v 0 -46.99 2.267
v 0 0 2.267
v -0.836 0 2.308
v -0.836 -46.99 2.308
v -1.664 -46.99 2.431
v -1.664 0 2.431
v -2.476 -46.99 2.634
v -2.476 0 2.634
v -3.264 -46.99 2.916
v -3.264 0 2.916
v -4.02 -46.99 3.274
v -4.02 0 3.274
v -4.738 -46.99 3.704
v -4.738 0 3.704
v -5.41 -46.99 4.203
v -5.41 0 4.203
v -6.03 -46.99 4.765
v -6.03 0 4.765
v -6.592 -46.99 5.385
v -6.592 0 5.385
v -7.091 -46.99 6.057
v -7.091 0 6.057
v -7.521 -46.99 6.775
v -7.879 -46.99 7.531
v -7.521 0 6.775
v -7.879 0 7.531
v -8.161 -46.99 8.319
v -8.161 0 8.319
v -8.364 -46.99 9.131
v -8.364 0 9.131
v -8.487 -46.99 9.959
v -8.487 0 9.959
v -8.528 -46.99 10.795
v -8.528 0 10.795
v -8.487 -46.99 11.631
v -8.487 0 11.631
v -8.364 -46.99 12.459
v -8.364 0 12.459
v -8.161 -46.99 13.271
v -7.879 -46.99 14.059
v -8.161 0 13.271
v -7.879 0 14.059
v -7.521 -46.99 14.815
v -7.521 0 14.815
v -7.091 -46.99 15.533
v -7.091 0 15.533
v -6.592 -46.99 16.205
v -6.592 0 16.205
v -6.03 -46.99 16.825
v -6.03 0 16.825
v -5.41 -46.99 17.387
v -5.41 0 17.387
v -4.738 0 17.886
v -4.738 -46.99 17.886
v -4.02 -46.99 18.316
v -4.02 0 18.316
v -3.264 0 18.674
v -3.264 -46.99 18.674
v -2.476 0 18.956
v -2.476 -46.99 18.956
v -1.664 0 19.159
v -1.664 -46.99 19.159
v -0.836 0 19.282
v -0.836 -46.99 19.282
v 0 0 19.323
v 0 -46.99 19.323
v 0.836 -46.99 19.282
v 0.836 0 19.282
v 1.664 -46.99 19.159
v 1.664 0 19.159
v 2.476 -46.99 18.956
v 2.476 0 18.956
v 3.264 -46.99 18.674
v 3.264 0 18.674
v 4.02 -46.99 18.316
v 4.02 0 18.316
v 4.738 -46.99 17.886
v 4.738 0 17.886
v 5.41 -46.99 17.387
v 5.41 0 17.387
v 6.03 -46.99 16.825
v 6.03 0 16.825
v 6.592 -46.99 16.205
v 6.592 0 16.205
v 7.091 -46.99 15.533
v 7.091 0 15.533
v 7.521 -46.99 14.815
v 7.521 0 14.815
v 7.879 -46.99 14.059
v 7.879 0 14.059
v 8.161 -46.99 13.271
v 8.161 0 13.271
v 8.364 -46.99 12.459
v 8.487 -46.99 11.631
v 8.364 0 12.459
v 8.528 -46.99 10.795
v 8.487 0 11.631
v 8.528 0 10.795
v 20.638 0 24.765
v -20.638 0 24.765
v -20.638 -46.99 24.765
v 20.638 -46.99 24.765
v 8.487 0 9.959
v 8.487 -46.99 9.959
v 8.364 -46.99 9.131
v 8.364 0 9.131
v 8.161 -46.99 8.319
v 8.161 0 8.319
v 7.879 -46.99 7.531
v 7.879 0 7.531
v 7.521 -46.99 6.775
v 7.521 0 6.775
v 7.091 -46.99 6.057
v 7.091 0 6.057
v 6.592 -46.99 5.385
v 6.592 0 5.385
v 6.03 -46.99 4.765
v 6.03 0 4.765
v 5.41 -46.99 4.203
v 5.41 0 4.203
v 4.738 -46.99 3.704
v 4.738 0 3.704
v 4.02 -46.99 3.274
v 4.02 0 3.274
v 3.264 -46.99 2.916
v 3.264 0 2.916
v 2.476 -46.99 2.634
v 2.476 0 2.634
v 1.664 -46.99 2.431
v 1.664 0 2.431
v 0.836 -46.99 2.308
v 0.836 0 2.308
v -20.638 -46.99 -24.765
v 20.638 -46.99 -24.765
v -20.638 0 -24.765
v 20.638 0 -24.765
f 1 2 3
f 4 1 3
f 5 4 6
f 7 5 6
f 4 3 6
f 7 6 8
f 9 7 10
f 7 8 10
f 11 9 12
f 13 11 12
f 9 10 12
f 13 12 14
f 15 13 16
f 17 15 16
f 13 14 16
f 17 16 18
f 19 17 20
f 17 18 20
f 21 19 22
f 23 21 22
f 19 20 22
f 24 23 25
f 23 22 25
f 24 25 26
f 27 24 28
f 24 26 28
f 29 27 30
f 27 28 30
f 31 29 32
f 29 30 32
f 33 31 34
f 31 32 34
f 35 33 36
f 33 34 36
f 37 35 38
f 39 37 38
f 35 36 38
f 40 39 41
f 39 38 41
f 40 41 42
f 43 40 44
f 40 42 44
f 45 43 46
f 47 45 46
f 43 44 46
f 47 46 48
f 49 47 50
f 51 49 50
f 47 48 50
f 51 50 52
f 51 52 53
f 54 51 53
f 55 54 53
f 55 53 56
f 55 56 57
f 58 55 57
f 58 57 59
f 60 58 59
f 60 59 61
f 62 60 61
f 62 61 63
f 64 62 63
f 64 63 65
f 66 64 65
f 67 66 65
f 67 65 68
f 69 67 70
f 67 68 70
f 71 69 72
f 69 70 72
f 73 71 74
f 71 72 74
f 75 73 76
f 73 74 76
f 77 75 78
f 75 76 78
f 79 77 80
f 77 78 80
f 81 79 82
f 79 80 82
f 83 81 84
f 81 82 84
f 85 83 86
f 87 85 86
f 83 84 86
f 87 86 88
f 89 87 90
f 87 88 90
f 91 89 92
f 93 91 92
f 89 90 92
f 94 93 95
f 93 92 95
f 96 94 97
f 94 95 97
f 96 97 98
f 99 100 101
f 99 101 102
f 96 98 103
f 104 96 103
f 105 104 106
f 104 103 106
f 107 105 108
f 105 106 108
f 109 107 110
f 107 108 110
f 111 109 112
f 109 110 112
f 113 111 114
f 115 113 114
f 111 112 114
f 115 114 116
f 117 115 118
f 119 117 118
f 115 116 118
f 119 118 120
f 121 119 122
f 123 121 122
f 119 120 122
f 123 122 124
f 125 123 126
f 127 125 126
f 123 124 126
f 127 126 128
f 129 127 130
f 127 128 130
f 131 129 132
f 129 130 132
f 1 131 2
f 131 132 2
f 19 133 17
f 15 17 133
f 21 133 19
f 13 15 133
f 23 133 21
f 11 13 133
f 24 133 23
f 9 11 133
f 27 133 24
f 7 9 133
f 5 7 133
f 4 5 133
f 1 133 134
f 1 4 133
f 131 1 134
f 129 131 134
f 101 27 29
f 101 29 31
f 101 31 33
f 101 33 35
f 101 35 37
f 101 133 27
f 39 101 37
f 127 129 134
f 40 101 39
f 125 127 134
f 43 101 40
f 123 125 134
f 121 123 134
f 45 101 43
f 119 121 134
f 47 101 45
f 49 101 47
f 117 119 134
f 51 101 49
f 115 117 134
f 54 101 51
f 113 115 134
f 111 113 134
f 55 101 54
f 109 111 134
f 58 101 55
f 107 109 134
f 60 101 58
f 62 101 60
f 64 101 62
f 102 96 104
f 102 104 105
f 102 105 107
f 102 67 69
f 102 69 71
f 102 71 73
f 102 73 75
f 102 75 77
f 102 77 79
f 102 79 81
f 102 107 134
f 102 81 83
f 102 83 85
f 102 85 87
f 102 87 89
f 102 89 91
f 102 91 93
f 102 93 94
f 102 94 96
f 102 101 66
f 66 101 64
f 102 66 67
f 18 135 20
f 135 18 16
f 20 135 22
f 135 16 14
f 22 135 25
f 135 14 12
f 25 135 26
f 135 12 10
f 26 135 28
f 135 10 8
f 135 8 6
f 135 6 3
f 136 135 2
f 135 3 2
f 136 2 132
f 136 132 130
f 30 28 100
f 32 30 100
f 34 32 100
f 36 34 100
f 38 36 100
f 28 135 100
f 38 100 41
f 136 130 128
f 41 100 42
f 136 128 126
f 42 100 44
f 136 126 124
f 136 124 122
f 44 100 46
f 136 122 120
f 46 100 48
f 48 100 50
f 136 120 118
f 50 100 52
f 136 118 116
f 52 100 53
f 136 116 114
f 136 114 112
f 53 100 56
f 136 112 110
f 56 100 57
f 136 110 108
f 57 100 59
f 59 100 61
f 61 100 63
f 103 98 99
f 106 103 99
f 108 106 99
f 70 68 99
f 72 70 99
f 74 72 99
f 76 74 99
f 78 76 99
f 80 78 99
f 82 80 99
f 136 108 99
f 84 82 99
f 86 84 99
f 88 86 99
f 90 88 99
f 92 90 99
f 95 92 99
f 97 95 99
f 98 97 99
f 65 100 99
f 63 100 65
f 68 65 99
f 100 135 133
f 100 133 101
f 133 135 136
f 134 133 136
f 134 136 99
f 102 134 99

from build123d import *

# Parameters (mm, degrees)
F0_W     = 41.275
F0_H     = 49.53
F1_DEPTH = 46.99


with BuildPart() as f1:
    # F0 (on Front) → F1 (new body)
    with BuildSketch(Plane.XZ):
        Rectangle(F0_W, F0_H)
        with BuildLine():
            ThreePointArc((0, 2.266854), (-6.03031, 16.82531), (8.528146, 10.795))
            ThreePointArc((8.528146, 10.795), (6.03031, 4.76469), (0, 2.266854))
        make_face(mode=Mode.SUBTRACT)
    extrude(amount=F1_DEPTH)


solid = f1.part
